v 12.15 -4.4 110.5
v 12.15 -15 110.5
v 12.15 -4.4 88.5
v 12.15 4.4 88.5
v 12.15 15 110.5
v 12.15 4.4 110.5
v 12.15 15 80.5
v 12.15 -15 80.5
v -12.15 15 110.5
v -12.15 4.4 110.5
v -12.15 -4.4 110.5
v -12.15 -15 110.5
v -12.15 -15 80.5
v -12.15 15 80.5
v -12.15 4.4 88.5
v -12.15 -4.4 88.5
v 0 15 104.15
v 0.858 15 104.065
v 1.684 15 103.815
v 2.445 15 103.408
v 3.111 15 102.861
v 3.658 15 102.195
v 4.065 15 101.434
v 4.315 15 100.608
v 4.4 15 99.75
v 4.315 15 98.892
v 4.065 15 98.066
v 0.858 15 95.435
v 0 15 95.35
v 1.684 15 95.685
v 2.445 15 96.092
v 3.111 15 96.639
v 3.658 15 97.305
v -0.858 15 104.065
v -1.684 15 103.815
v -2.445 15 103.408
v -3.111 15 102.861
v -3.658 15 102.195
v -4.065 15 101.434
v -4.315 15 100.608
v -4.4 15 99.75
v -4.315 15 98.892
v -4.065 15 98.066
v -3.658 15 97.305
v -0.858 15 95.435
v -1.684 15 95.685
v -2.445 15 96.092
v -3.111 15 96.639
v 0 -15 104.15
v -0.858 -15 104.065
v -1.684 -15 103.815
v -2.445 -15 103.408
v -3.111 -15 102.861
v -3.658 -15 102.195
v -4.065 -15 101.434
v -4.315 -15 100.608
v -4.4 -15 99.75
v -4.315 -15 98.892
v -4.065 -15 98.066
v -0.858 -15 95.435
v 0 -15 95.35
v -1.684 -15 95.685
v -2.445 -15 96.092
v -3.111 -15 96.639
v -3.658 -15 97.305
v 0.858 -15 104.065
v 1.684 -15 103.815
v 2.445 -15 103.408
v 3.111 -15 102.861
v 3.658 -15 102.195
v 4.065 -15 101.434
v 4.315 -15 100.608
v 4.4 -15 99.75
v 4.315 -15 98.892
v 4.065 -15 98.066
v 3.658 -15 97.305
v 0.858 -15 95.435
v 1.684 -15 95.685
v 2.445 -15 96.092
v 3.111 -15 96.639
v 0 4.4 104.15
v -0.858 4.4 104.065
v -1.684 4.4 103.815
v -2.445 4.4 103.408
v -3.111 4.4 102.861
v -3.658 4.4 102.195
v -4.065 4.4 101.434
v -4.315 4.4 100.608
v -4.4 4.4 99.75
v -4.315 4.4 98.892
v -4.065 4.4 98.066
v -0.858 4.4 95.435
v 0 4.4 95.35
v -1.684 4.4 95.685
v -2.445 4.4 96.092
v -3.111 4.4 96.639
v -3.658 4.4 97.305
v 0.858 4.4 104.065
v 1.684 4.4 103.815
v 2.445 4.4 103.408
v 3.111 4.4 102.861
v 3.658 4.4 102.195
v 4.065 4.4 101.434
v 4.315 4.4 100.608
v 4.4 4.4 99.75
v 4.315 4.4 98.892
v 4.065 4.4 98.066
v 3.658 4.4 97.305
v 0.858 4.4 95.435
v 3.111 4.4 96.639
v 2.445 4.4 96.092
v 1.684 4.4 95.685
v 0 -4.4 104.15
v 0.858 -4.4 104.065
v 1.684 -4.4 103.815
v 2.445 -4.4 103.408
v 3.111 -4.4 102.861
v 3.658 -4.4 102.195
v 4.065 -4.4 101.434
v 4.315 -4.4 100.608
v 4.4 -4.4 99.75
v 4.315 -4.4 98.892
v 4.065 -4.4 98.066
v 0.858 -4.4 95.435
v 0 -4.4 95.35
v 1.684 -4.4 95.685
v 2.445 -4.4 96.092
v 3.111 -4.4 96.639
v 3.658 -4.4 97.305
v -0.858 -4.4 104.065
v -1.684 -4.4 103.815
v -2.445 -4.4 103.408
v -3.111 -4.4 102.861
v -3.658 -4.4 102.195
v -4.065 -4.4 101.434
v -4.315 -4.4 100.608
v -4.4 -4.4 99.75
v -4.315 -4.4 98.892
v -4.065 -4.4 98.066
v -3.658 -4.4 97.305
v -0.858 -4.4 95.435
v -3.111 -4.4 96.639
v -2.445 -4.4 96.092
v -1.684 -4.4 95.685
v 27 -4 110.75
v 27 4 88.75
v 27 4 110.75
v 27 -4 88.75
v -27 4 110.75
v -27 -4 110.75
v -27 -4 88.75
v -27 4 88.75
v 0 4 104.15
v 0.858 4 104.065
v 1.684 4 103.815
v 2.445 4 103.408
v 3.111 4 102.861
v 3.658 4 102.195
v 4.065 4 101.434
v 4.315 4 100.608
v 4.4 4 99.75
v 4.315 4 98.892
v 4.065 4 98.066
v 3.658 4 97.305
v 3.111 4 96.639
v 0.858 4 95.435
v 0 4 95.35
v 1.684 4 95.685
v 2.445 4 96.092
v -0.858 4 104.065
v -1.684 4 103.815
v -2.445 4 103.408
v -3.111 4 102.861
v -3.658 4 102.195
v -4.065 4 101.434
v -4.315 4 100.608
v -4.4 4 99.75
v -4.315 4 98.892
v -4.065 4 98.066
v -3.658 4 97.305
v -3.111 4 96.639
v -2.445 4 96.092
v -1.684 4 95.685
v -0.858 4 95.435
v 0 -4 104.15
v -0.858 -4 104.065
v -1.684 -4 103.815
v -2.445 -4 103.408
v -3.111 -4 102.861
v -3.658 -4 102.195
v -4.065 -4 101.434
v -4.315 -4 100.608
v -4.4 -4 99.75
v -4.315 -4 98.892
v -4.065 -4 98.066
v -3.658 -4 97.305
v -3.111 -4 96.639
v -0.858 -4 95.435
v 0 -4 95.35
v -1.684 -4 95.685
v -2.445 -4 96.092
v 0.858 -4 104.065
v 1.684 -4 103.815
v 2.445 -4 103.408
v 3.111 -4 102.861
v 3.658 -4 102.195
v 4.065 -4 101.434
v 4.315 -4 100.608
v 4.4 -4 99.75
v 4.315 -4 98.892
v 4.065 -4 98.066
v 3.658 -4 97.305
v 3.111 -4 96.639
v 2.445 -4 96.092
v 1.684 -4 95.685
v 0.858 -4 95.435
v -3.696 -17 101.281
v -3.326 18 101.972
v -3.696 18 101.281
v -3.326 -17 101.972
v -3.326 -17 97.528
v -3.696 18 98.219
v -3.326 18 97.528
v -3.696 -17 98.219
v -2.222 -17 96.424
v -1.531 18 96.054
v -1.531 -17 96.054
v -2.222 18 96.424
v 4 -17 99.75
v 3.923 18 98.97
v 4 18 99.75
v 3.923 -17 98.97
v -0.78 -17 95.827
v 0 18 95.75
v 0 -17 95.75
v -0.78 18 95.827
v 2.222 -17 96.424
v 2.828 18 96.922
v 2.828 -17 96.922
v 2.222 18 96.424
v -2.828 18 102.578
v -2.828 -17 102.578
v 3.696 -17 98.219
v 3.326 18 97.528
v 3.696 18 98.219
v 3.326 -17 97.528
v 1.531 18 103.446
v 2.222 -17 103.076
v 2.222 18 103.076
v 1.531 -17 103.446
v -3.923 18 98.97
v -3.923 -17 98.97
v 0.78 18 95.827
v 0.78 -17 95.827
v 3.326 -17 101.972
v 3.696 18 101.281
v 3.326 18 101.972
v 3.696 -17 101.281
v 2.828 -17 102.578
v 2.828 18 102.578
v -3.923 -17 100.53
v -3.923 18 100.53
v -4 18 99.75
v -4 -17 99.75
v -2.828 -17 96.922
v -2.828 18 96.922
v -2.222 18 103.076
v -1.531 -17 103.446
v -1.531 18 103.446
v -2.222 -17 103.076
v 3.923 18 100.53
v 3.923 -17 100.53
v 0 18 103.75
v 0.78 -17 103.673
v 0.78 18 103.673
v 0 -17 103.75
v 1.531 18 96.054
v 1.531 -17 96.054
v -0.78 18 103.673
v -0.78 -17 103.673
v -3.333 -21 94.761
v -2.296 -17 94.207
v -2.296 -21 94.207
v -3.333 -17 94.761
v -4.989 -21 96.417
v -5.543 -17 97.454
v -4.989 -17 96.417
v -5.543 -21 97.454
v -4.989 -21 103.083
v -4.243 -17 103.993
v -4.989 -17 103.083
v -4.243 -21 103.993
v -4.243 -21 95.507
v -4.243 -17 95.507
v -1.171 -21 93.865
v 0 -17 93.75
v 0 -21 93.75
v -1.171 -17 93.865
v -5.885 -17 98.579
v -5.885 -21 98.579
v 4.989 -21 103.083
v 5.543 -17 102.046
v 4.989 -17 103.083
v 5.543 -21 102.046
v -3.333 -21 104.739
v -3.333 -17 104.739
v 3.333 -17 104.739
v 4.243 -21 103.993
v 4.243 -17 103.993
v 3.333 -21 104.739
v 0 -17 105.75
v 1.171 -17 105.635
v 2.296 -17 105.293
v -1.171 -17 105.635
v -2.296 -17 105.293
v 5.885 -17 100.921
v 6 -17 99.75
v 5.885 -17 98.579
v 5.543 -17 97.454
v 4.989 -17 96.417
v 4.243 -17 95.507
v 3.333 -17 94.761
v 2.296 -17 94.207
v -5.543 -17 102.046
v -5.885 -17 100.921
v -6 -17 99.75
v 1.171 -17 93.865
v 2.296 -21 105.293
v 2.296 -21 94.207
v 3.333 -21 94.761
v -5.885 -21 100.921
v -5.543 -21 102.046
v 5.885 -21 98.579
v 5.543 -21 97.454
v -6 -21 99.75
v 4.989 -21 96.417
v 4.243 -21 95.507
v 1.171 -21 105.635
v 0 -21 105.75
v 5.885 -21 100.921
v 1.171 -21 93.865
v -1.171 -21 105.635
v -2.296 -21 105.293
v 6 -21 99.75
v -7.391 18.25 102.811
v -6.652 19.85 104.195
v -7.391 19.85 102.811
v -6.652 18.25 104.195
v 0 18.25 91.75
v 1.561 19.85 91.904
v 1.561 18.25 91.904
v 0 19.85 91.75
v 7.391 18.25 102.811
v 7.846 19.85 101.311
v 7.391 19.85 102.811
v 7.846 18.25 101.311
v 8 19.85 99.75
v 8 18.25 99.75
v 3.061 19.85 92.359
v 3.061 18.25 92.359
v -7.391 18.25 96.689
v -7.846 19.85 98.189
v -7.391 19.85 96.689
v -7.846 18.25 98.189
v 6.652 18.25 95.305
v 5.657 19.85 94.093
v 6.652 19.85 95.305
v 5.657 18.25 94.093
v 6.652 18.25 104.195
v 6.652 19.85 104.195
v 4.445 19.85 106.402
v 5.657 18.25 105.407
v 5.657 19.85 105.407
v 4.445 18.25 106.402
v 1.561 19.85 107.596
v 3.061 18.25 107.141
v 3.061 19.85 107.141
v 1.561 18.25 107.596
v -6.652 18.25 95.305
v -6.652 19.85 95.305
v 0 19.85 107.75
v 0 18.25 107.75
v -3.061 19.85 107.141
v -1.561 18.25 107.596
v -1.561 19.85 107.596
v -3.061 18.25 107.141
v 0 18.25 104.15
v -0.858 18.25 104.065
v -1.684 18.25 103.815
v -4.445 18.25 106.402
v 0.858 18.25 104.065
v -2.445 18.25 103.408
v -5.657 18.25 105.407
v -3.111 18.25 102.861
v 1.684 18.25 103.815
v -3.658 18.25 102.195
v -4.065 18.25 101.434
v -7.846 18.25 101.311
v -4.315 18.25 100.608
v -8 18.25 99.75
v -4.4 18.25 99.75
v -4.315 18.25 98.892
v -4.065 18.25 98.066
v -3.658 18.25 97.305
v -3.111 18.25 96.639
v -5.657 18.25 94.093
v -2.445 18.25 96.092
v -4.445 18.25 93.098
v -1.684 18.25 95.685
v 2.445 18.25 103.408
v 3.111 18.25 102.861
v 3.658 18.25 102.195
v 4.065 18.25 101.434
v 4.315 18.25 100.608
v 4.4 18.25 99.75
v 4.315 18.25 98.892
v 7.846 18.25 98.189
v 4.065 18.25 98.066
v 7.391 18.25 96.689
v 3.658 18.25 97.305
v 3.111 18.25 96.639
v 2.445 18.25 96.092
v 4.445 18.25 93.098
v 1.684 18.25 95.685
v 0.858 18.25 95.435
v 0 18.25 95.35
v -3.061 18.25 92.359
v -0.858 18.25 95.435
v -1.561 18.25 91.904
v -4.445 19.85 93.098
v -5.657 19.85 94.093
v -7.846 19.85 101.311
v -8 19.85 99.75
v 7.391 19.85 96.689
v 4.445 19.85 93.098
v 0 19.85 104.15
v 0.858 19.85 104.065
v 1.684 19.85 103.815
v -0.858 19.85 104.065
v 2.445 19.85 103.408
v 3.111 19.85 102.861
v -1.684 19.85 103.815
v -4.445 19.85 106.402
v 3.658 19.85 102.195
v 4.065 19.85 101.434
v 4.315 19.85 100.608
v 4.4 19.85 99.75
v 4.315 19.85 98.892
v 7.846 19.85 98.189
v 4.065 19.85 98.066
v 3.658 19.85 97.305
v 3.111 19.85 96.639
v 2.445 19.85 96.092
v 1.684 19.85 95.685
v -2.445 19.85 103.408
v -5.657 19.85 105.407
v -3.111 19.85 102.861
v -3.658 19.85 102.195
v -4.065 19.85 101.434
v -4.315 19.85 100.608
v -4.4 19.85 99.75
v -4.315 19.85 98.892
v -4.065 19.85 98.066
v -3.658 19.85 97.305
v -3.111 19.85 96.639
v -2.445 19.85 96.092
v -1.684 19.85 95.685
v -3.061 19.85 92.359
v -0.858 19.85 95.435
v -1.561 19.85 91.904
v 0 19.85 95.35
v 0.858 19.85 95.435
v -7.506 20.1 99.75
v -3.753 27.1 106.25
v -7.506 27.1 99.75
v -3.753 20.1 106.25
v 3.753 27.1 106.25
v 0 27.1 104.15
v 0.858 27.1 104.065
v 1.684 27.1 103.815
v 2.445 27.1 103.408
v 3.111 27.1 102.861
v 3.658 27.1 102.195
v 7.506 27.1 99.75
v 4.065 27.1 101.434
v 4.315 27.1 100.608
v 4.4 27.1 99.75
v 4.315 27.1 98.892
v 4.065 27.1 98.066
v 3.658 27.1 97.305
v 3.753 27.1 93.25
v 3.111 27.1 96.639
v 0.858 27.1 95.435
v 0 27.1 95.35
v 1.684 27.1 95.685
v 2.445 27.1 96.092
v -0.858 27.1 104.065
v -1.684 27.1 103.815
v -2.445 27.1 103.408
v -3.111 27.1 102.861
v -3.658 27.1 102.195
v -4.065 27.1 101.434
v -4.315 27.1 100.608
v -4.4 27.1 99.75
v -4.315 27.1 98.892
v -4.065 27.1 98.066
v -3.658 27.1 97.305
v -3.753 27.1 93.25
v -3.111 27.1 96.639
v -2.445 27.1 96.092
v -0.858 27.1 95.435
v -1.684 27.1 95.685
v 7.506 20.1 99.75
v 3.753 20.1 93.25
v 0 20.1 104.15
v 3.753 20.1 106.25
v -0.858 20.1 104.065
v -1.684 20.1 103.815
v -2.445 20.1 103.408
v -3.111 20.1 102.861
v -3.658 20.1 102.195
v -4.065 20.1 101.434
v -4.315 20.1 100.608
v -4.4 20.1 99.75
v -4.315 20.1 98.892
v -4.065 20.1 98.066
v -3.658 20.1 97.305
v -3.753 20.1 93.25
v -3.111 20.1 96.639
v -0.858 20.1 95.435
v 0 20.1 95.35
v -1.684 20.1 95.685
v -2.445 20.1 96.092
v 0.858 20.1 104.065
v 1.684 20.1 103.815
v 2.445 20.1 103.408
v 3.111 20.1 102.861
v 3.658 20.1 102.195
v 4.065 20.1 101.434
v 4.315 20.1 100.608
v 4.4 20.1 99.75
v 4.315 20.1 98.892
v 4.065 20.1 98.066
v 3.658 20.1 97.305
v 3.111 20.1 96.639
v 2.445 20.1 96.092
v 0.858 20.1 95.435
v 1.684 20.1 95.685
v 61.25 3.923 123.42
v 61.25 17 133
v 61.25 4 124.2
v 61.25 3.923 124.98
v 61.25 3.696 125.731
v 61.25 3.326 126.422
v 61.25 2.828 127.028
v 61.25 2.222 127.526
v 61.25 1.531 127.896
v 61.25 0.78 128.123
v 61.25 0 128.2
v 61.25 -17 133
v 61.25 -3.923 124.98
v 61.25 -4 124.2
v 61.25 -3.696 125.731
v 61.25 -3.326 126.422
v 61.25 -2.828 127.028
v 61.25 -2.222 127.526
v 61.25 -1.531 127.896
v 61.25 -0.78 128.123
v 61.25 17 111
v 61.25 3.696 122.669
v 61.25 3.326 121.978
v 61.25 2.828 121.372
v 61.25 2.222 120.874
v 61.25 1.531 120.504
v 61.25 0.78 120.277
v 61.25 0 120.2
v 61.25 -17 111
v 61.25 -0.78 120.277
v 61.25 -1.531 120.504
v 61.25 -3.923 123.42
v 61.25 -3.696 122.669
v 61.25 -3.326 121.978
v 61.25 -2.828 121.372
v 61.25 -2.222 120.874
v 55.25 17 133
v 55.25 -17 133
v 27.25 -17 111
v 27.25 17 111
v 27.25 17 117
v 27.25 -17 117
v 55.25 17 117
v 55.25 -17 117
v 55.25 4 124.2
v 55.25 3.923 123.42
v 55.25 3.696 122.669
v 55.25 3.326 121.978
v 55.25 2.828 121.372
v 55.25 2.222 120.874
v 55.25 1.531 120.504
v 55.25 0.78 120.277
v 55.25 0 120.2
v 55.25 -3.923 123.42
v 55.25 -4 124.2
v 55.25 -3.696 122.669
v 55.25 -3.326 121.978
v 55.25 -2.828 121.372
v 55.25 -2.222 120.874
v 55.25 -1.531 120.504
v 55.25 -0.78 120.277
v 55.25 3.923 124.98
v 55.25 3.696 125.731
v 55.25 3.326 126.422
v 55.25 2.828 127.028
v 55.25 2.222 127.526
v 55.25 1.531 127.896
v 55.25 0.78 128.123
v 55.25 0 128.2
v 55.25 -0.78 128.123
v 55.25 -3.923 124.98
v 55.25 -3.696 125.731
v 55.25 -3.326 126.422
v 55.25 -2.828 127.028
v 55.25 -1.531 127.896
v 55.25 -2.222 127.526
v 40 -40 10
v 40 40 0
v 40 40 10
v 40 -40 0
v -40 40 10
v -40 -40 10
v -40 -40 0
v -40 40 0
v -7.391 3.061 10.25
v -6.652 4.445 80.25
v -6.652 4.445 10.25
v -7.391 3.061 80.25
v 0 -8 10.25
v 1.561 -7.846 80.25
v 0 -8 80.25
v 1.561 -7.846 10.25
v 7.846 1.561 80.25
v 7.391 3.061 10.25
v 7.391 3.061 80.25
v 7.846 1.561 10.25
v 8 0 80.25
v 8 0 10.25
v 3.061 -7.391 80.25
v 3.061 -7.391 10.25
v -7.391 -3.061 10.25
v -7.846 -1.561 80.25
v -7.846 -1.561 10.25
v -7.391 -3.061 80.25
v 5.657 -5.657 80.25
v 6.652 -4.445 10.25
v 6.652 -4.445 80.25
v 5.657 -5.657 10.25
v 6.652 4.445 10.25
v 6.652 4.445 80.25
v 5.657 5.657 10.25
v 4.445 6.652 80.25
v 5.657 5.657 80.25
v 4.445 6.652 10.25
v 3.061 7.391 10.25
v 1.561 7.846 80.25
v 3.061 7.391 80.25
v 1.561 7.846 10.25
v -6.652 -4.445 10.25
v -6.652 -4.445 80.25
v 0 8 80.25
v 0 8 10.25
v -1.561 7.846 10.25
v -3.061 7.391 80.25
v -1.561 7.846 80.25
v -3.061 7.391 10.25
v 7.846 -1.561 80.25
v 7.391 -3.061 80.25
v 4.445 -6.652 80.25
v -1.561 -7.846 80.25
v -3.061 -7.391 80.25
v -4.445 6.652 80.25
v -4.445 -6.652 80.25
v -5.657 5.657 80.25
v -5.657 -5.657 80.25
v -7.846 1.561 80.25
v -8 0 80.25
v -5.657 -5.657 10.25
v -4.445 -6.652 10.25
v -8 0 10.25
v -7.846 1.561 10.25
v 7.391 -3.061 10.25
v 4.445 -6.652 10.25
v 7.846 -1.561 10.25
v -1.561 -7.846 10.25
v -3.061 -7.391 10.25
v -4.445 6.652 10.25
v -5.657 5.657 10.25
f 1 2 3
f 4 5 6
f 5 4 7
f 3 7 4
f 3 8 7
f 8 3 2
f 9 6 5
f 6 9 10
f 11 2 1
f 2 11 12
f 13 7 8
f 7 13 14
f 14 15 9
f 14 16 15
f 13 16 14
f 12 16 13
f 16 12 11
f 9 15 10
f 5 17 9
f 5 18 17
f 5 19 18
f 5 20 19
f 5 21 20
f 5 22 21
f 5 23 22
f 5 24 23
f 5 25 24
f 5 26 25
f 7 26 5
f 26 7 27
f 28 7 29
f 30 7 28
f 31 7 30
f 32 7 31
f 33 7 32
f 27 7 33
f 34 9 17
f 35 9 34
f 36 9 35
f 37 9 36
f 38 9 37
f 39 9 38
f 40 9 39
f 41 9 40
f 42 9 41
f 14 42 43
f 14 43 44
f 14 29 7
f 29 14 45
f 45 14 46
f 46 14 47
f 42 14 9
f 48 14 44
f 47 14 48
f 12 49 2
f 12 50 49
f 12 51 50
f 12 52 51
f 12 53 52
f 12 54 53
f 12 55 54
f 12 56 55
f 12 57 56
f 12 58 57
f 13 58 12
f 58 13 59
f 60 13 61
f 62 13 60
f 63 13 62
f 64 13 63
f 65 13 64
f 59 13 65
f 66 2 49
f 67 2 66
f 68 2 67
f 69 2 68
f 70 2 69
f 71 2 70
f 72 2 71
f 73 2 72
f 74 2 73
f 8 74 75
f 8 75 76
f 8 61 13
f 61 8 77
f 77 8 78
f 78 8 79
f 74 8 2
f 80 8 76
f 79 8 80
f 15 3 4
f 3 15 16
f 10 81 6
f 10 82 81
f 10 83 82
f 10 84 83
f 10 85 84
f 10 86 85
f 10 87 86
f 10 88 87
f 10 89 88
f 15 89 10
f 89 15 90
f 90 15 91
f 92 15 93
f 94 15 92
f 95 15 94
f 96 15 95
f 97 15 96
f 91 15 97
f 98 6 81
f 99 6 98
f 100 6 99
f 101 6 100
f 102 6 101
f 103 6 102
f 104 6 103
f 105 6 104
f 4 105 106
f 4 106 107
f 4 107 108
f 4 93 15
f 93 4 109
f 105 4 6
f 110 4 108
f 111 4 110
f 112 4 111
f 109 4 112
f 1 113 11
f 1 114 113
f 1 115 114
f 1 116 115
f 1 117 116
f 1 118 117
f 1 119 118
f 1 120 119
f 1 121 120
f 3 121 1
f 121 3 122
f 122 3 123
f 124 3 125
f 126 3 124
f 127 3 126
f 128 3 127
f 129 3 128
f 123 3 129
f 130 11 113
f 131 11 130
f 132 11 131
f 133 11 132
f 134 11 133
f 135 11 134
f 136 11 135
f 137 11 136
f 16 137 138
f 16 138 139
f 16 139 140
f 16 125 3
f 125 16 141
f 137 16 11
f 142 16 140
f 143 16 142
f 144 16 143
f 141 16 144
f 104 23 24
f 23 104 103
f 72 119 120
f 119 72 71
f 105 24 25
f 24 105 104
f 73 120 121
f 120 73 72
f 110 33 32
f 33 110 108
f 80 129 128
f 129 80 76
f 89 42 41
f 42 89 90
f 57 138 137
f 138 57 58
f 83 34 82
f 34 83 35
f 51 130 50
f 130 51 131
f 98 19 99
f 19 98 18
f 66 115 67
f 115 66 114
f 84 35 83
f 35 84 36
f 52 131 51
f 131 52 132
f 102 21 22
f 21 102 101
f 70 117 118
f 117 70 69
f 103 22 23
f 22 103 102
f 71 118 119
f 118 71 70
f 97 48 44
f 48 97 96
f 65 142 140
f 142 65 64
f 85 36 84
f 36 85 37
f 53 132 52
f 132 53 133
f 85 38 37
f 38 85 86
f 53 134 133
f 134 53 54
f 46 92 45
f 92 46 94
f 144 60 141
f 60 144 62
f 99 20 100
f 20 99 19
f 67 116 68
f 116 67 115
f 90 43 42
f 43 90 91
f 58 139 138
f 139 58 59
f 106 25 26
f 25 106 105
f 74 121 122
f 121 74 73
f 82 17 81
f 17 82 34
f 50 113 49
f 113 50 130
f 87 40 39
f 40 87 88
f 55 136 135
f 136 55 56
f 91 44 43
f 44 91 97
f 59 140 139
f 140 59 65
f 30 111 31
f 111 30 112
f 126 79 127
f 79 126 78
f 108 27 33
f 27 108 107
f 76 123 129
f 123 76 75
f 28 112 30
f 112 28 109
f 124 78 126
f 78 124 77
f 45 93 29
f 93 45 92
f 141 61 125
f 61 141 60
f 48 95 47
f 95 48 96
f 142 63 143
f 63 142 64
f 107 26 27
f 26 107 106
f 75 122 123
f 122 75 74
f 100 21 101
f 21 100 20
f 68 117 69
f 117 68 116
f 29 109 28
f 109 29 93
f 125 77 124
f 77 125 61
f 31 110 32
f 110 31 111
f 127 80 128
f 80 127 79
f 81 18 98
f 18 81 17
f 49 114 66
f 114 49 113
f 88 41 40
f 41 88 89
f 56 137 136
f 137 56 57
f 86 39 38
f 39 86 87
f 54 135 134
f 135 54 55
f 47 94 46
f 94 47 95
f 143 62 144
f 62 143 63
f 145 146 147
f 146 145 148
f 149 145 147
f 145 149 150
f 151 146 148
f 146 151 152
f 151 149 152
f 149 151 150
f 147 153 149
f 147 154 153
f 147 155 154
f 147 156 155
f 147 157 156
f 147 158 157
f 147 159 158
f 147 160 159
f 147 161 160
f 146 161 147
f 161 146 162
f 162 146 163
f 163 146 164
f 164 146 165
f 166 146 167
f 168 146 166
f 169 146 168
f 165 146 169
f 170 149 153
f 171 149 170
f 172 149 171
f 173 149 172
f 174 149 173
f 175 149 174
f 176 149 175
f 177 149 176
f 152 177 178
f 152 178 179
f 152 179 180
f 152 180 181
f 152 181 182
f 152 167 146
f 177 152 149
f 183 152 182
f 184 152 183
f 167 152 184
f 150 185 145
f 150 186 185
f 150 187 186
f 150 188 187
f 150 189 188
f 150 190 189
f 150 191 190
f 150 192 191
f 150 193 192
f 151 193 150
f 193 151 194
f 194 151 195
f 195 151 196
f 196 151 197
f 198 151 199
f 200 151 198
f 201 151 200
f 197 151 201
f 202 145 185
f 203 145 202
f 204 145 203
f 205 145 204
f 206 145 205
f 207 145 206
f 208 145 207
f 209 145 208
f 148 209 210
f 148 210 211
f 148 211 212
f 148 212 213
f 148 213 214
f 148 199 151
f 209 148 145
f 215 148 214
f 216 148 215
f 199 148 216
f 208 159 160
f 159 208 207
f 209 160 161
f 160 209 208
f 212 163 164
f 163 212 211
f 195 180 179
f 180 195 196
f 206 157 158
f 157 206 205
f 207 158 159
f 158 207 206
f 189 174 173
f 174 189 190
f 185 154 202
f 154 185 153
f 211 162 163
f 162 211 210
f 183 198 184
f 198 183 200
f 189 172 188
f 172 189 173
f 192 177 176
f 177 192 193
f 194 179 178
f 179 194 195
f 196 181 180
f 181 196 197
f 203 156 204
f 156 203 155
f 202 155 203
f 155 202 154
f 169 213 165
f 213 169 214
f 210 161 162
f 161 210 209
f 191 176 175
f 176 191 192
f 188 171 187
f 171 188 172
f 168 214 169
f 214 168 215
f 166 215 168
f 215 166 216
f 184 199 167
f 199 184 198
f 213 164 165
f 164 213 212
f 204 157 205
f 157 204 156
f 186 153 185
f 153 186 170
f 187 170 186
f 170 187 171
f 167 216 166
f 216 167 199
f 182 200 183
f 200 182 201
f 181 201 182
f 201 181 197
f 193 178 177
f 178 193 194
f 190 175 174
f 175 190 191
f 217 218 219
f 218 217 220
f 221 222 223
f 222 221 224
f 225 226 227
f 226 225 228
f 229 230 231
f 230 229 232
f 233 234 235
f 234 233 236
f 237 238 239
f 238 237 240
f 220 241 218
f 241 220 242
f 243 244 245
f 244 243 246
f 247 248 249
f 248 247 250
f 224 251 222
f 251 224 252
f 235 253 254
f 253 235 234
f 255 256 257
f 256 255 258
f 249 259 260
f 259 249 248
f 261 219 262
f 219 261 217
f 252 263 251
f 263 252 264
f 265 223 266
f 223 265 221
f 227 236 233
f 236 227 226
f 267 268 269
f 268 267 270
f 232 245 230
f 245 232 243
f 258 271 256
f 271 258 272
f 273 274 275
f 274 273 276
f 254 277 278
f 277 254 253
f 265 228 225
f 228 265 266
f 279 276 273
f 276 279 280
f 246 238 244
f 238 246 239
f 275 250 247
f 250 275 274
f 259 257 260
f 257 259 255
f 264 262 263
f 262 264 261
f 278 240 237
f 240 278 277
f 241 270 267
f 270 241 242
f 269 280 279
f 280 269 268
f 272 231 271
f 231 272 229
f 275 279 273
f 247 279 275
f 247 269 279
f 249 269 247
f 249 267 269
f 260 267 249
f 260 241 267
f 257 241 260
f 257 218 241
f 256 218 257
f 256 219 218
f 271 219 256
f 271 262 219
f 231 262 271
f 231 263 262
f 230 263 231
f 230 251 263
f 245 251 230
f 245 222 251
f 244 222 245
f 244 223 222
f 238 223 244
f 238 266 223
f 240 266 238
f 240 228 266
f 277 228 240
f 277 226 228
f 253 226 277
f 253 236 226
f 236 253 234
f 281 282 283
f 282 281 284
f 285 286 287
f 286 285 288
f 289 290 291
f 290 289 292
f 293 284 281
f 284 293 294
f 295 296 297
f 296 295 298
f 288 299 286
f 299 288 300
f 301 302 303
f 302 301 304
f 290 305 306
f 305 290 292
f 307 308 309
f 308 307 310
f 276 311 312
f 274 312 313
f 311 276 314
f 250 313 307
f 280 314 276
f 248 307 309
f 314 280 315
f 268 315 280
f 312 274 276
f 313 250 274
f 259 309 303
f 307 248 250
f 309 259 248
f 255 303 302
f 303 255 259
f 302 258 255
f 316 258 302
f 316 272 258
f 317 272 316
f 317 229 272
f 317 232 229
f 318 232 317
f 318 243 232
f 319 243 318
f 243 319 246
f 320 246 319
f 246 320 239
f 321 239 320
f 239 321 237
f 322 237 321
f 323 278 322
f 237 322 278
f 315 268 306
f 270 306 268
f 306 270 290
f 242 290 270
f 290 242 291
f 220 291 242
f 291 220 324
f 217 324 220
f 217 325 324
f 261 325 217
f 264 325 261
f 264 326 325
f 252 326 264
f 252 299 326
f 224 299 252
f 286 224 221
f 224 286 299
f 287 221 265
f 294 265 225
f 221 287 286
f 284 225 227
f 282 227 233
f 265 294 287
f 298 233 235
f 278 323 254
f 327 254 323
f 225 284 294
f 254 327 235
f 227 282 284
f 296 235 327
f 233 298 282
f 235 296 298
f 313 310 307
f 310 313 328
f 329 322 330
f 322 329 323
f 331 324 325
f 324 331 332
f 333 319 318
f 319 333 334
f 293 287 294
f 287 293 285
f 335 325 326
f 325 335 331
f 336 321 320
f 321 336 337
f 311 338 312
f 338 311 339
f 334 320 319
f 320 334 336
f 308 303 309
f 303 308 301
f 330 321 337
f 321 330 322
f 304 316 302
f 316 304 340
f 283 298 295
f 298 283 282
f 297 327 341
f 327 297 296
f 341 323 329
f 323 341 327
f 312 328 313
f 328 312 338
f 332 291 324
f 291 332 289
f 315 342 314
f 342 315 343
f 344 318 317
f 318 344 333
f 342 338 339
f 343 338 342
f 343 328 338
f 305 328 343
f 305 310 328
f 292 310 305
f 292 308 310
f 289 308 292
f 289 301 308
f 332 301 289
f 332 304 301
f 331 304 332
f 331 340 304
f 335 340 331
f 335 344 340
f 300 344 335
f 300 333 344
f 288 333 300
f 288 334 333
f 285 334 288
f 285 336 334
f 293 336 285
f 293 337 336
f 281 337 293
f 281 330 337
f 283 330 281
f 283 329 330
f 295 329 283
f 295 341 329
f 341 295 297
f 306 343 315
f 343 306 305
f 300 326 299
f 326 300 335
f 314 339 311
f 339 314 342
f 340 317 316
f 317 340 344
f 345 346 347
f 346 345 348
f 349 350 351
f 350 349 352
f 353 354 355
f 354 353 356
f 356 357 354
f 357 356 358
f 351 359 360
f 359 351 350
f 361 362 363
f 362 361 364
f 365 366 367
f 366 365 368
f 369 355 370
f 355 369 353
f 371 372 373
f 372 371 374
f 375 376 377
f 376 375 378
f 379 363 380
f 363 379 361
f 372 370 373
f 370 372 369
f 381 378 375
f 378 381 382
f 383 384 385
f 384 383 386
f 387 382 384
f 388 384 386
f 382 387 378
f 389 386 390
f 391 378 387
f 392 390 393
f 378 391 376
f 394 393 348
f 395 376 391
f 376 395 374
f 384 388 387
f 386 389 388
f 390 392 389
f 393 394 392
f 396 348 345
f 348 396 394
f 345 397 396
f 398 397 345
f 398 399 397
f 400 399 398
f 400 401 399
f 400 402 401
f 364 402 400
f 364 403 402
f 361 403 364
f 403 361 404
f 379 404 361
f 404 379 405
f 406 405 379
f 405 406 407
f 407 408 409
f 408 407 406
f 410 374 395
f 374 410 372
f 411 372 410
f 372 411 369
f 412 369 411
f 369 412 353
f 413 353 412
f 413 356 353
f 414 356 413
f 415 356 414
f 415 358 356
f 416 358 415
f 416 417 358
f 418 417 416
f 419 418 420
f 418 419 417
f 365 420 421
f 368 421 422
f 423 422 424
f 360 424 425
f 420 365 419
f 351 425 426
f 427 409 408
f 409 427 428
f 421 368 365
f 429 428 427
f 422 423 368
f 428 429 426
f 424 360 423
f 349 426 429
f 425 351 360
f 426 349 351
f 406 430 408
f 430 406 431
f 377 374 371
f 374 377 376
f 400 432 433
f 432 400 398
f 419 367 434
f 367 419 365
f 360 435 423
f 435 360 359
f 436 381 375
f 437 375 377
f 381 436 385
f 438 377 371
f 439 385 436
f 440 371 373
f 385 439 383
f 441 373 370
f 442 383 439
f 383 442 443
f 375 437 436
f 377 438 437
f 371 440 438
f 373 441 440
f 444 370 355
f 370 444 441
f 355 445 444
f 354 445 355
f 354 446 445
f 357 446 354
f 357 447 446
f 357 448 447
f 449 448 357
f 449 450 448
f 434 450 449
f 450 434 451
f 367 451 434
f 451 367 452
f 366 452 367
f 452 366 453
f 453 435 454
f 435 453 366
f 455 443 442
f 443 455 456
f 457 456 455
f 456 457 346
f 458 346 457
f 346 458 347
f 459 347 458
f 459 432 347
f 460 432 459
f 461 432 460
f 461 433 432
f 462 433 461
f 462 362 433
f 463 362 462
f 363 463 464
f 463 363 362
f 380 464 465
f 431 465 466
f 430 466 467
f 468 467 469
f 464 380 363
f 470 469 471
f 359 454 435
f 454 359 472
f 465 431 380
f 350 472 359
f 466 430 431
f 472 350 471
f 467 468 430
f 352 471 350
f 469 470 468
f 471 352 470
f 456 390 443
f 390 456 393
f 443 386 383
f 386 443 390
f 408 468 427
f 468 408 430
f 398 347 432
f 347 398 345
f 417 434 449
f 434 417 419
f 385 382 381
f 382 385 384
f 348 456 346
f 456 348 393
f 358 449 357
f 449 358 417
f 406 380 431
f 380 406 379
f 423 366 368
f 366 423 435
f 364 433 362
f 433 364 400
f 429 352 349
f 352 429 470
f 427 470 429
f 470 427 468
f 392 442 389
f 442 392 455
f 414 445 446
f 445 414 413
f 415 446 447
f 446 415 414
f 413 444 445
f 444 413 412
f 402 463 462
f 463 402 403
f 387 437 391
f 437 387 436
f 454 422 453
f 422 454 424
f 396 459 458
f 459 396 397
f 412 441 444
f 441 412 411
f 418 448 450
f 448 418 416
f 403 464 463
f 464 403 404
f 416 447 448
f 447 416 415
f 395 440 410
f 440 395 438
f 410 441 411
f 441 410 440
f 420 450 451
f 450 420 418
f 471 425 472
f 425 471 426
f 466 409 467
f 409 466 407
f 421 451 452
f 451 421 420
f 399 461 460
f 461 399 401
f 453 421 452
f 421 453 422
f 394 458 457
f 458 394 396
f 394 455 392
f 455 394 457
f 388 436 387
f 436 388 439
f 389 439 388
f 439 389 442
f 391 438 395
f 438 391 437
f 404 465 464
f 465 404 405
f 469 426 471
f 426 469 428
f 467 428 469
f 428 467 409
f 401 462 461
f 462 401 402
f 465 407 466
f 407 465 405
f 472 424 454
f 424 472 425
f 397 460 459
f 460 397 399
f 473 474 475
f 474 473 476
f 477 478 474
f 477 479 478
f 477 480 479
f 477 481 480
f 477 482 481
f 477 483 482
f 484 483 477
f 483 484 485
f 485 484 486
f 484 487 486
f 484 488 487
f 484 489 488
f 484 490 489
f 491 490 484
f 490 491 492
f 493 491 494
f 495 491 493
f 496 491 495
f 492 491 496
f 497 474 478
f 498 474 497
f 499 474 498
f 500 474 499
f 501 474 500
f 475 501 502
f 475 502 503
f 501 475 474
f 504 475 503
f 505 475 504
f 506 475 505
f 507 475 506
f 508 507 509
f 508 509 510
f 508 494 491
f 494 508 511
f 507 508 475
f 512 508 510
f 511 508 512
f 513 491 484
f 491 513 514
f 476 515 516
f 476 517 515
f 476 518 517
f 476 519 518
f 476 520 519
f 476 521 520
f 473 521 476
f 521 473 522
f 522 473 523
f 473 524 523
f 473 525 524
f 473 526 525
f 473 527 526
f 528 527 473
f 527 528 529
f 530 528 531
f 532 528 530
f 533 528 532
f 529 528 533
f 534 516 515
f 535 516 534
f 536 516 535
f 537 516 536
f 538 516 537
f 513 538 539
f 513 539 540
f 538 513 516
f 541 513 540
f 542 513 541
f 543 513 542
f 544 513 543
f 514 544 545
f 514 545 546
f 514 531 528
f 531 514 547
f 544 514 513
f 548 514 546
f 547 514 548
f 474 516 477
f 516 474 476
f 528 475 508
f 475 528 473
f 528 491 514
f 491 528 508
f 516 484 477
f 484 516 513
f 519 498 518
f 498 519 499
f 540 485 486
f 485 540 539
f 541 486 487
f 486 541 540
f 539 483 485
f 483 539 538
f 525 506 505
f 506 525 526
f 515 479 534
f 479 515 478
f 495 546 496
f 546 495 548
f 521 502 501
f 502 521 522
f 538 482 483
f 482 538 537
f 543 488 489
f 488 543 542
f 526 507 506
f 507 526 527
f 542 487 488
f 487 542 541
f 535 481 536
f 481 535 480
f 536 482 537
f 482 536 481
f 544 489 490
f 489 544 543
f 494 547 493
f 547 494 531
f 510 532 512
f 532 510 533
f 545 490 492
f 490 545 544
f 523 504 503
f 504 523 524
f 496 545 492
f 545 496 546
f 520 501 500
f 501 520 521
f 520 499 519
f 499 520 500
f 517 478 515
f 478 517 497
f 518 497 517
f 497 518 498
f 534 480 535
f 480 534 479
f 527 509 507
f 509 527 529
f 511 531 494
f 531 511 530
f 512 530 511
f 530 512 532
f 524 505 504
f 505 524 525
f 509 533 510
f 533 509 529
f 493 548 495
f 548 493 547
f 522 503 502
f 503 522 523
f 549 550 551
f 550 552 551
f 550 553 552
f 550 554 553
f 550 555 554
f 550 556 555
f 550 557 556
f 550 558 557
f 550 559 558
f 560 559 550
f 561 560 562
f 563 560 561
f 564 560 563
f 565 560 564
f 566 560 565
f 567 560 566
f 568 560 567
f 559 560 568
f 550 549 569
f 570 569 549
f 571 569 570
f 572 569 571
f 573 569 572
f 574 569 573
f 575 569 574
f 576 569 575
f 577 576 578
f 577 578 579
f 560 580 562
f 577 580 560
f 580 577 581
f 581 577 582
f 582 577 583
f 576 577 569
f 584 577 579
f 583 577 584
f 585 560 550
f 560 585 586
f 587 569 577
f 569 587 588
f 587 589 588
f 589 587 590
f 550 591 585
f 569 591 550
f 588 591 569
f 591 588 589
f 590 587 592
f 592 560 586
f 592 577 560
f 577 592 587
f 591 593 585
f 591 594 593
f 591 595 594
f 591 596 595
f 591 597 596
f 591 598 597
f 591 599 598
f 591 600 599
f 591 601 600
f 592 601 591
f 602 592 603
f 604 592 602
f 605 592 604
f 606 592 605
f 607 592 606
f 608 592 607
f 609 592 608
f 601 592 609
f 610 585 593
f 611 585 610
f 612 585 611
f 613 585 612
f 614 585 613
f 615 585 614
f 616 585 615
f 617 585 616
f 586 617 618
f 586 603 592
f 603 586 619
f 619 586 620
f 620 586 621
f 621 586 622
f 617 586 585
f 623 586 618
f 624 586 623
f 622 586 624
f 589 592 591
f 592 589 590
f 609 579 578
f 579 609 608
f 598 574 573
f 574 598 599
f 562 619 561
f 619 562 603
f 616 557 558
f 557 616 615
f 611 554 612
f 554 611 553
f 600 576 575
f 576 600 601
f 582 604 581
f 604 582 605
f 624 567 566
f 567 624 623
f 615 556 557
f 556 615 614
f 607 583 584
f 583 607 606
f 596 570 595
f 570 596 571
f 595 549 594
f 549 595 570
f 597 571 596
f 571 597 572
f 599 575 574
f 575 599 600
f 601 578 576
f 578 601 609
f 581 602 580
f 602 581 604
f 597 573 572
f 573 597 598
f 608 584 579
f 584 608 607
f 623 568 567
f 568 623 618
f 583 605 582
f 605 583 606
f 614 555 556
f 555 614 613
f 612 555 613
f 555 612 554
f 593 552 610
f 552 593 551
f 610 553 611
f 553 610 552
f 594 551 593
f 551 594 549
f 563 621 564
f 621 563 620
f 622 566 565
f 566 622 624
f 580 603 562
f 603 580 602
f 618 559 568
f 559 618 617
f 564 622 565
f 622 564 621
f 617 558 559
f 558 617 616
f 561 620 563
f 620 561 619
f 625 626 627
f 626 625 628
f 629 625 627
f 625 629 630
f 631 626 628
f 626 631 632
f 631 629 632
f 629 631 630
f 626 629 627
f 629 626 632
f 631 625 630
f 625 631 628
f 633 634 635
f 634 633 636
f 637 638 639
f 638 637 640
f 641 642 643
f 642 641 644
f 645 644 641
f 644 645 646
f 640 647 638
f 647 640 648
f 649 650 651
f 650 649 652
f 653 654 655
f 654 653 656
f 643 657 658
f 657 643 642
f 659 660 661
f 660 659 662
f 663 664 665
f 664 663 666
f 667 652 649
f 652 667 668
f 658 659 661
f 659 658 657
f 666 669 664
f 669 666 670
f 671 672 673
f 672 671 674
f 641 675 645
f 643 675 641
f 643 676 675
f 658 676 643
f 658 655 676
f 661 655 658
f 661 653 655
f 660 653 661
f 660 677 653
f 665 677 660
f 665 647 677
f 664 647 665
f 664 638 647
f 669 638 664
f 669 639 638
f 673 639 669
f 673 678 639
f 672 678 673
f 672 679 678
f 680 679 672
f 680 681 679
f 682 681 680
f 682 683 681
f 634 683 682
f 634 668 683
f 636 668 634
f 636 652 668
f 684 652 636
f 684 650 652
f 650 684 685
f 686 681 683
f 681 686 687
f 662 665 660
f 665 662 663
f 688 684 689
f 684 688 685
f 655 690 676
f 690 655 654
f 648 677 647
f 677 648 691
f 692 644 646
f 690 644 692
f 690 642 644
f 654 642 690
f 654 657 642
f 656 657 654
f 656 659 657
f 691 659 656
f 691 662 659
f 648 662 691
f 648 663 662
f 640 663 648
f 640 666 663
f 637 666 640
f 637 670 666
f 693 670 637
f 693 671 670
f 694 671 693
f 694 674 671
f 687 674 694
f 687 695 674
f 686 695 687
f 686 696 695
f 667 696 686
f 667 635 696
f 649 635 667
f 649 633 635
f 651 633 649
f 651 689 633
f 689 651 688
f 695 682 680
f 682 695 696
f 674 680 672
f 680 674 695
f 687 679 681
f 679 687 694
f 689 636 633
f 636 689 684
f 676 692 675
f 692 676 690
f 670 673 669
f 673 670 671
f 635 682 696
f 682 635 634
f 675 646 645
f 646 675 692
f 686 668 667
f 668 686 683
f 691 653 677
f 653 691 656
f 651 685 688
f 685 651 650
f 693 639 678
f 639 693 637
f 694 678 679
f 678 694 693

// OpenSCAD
$fn = 32;

// ------------------------------------------------------------------------
// Lamp arm: column d16 x 70 mm, arm 54 mm
// Every part is its own module, assembly() places every instance.
// ------------------------------------------------------------------------

// --- part 1 ---
module lamp_base() {
  difference() {
    translate([-40, -40, 0]) cube([80, 80, 10]);
  }
}

// --- part 2 ---
module lamp_column() {
  cylinder(h = 70, d = 16);
}

// --- part 3 ---
module head_fork() {
  difference() {
    translate([-12.15, -15, 0]) cube([24.3, 30, 30]);
    translate([-13.15, -4.4, 8]) cube([26.3, 8.8, 23]);
    translate([0, 0, 19.25]) rotate([90, 0, 0]) cylinder(h = 32, d = 8.8, center = true);
  }
}

// --- part 4 ---
module lamp_arm() {
  difference() {
    translate([-27, -4, 0]) cube([54, 8, 22]);
    translate([0, 0, 11]) rotate([90, 0, 0]) cylinder(h = 10, d = 8.8, center = true);
  }
}

// --- part 5 ---
module arm_pin() {
  rotate([0, 90, 0]) cylinder(h = 36, d = 8, center = true);
  translate([-21, 0, 0]) rotate([0, 90, 0]) cylinder(h = 4, d = 12);
}

// --- part 6 ---
module arm_washer() {
  difference() {
      translate([0, 0, 0]) cylinder(h = 1.6, d = 16);
      translate([0, 0, -1]) cylinder(h = 3.6, d = 8.8);
    }
}

// --- part 7 ---
module arm_nut() {
  difference() {
    linear_extrude(height = 7) polygon(points = [[7.506, 0], [3.753, 6.5], [-3.753, 6.5], [-7.506, 0], [-3.753, -6.5], [3.753, -6.5]]);
    translate([0, 0, -1]) cylinder(h = 9, d = 8.8);
  }
}

// --- part 8 ---
module shade_bracket() {
  difference() {
    translate([-17, -17, 0]) cube([34, 34, 22]);
    translate([-18, -18, 6]) cube([29, 36, 17]);
    translate([14, 0, 13.2]) rotate([0, 90, 0]) cylinder(h = 8, d = 8, center = true);
  }
}

// --- assembly ---
module assembly() {
  color([0.80, 0.24, 0.20]) translate([0, 0, 0]) rotate([0, 0, 0]) lamp_base();
  color([0.20, 0.45, 0.75]) translate([0, 0, 10.25]) rotate([0, 0, 0]) lamp_column();
  color([0.25, 0.62, 0.32]) translate([0, 0, 80.5]) rotate([0, 0, 0]) head_fork();
  color([0.92, 0.70, 0.18]) translate([0, 0, 88.75]) rotate([0, 0, 0]) lamp_arm();
  color([0.58, 0.35, 0.70]) translate([0, 0, 99.75]) rotate([0, 0, 90]) arm_pin();
  color([0.16, 0.66, 0.66]) translate([0, 19.85, 99.75]) rotate([90, 0, 0]) arm_washer();
  color([0.85, 0.48, 0.18]) translate([0, 27.1, 99.75]) rotate([90, 0, 0]) arm_nut();
  color([0.55, 0.60, 0.65]) translate([44.25, 0, 111]) rotate([0, 0, 0]) shade_bracket();
}

assembly();
